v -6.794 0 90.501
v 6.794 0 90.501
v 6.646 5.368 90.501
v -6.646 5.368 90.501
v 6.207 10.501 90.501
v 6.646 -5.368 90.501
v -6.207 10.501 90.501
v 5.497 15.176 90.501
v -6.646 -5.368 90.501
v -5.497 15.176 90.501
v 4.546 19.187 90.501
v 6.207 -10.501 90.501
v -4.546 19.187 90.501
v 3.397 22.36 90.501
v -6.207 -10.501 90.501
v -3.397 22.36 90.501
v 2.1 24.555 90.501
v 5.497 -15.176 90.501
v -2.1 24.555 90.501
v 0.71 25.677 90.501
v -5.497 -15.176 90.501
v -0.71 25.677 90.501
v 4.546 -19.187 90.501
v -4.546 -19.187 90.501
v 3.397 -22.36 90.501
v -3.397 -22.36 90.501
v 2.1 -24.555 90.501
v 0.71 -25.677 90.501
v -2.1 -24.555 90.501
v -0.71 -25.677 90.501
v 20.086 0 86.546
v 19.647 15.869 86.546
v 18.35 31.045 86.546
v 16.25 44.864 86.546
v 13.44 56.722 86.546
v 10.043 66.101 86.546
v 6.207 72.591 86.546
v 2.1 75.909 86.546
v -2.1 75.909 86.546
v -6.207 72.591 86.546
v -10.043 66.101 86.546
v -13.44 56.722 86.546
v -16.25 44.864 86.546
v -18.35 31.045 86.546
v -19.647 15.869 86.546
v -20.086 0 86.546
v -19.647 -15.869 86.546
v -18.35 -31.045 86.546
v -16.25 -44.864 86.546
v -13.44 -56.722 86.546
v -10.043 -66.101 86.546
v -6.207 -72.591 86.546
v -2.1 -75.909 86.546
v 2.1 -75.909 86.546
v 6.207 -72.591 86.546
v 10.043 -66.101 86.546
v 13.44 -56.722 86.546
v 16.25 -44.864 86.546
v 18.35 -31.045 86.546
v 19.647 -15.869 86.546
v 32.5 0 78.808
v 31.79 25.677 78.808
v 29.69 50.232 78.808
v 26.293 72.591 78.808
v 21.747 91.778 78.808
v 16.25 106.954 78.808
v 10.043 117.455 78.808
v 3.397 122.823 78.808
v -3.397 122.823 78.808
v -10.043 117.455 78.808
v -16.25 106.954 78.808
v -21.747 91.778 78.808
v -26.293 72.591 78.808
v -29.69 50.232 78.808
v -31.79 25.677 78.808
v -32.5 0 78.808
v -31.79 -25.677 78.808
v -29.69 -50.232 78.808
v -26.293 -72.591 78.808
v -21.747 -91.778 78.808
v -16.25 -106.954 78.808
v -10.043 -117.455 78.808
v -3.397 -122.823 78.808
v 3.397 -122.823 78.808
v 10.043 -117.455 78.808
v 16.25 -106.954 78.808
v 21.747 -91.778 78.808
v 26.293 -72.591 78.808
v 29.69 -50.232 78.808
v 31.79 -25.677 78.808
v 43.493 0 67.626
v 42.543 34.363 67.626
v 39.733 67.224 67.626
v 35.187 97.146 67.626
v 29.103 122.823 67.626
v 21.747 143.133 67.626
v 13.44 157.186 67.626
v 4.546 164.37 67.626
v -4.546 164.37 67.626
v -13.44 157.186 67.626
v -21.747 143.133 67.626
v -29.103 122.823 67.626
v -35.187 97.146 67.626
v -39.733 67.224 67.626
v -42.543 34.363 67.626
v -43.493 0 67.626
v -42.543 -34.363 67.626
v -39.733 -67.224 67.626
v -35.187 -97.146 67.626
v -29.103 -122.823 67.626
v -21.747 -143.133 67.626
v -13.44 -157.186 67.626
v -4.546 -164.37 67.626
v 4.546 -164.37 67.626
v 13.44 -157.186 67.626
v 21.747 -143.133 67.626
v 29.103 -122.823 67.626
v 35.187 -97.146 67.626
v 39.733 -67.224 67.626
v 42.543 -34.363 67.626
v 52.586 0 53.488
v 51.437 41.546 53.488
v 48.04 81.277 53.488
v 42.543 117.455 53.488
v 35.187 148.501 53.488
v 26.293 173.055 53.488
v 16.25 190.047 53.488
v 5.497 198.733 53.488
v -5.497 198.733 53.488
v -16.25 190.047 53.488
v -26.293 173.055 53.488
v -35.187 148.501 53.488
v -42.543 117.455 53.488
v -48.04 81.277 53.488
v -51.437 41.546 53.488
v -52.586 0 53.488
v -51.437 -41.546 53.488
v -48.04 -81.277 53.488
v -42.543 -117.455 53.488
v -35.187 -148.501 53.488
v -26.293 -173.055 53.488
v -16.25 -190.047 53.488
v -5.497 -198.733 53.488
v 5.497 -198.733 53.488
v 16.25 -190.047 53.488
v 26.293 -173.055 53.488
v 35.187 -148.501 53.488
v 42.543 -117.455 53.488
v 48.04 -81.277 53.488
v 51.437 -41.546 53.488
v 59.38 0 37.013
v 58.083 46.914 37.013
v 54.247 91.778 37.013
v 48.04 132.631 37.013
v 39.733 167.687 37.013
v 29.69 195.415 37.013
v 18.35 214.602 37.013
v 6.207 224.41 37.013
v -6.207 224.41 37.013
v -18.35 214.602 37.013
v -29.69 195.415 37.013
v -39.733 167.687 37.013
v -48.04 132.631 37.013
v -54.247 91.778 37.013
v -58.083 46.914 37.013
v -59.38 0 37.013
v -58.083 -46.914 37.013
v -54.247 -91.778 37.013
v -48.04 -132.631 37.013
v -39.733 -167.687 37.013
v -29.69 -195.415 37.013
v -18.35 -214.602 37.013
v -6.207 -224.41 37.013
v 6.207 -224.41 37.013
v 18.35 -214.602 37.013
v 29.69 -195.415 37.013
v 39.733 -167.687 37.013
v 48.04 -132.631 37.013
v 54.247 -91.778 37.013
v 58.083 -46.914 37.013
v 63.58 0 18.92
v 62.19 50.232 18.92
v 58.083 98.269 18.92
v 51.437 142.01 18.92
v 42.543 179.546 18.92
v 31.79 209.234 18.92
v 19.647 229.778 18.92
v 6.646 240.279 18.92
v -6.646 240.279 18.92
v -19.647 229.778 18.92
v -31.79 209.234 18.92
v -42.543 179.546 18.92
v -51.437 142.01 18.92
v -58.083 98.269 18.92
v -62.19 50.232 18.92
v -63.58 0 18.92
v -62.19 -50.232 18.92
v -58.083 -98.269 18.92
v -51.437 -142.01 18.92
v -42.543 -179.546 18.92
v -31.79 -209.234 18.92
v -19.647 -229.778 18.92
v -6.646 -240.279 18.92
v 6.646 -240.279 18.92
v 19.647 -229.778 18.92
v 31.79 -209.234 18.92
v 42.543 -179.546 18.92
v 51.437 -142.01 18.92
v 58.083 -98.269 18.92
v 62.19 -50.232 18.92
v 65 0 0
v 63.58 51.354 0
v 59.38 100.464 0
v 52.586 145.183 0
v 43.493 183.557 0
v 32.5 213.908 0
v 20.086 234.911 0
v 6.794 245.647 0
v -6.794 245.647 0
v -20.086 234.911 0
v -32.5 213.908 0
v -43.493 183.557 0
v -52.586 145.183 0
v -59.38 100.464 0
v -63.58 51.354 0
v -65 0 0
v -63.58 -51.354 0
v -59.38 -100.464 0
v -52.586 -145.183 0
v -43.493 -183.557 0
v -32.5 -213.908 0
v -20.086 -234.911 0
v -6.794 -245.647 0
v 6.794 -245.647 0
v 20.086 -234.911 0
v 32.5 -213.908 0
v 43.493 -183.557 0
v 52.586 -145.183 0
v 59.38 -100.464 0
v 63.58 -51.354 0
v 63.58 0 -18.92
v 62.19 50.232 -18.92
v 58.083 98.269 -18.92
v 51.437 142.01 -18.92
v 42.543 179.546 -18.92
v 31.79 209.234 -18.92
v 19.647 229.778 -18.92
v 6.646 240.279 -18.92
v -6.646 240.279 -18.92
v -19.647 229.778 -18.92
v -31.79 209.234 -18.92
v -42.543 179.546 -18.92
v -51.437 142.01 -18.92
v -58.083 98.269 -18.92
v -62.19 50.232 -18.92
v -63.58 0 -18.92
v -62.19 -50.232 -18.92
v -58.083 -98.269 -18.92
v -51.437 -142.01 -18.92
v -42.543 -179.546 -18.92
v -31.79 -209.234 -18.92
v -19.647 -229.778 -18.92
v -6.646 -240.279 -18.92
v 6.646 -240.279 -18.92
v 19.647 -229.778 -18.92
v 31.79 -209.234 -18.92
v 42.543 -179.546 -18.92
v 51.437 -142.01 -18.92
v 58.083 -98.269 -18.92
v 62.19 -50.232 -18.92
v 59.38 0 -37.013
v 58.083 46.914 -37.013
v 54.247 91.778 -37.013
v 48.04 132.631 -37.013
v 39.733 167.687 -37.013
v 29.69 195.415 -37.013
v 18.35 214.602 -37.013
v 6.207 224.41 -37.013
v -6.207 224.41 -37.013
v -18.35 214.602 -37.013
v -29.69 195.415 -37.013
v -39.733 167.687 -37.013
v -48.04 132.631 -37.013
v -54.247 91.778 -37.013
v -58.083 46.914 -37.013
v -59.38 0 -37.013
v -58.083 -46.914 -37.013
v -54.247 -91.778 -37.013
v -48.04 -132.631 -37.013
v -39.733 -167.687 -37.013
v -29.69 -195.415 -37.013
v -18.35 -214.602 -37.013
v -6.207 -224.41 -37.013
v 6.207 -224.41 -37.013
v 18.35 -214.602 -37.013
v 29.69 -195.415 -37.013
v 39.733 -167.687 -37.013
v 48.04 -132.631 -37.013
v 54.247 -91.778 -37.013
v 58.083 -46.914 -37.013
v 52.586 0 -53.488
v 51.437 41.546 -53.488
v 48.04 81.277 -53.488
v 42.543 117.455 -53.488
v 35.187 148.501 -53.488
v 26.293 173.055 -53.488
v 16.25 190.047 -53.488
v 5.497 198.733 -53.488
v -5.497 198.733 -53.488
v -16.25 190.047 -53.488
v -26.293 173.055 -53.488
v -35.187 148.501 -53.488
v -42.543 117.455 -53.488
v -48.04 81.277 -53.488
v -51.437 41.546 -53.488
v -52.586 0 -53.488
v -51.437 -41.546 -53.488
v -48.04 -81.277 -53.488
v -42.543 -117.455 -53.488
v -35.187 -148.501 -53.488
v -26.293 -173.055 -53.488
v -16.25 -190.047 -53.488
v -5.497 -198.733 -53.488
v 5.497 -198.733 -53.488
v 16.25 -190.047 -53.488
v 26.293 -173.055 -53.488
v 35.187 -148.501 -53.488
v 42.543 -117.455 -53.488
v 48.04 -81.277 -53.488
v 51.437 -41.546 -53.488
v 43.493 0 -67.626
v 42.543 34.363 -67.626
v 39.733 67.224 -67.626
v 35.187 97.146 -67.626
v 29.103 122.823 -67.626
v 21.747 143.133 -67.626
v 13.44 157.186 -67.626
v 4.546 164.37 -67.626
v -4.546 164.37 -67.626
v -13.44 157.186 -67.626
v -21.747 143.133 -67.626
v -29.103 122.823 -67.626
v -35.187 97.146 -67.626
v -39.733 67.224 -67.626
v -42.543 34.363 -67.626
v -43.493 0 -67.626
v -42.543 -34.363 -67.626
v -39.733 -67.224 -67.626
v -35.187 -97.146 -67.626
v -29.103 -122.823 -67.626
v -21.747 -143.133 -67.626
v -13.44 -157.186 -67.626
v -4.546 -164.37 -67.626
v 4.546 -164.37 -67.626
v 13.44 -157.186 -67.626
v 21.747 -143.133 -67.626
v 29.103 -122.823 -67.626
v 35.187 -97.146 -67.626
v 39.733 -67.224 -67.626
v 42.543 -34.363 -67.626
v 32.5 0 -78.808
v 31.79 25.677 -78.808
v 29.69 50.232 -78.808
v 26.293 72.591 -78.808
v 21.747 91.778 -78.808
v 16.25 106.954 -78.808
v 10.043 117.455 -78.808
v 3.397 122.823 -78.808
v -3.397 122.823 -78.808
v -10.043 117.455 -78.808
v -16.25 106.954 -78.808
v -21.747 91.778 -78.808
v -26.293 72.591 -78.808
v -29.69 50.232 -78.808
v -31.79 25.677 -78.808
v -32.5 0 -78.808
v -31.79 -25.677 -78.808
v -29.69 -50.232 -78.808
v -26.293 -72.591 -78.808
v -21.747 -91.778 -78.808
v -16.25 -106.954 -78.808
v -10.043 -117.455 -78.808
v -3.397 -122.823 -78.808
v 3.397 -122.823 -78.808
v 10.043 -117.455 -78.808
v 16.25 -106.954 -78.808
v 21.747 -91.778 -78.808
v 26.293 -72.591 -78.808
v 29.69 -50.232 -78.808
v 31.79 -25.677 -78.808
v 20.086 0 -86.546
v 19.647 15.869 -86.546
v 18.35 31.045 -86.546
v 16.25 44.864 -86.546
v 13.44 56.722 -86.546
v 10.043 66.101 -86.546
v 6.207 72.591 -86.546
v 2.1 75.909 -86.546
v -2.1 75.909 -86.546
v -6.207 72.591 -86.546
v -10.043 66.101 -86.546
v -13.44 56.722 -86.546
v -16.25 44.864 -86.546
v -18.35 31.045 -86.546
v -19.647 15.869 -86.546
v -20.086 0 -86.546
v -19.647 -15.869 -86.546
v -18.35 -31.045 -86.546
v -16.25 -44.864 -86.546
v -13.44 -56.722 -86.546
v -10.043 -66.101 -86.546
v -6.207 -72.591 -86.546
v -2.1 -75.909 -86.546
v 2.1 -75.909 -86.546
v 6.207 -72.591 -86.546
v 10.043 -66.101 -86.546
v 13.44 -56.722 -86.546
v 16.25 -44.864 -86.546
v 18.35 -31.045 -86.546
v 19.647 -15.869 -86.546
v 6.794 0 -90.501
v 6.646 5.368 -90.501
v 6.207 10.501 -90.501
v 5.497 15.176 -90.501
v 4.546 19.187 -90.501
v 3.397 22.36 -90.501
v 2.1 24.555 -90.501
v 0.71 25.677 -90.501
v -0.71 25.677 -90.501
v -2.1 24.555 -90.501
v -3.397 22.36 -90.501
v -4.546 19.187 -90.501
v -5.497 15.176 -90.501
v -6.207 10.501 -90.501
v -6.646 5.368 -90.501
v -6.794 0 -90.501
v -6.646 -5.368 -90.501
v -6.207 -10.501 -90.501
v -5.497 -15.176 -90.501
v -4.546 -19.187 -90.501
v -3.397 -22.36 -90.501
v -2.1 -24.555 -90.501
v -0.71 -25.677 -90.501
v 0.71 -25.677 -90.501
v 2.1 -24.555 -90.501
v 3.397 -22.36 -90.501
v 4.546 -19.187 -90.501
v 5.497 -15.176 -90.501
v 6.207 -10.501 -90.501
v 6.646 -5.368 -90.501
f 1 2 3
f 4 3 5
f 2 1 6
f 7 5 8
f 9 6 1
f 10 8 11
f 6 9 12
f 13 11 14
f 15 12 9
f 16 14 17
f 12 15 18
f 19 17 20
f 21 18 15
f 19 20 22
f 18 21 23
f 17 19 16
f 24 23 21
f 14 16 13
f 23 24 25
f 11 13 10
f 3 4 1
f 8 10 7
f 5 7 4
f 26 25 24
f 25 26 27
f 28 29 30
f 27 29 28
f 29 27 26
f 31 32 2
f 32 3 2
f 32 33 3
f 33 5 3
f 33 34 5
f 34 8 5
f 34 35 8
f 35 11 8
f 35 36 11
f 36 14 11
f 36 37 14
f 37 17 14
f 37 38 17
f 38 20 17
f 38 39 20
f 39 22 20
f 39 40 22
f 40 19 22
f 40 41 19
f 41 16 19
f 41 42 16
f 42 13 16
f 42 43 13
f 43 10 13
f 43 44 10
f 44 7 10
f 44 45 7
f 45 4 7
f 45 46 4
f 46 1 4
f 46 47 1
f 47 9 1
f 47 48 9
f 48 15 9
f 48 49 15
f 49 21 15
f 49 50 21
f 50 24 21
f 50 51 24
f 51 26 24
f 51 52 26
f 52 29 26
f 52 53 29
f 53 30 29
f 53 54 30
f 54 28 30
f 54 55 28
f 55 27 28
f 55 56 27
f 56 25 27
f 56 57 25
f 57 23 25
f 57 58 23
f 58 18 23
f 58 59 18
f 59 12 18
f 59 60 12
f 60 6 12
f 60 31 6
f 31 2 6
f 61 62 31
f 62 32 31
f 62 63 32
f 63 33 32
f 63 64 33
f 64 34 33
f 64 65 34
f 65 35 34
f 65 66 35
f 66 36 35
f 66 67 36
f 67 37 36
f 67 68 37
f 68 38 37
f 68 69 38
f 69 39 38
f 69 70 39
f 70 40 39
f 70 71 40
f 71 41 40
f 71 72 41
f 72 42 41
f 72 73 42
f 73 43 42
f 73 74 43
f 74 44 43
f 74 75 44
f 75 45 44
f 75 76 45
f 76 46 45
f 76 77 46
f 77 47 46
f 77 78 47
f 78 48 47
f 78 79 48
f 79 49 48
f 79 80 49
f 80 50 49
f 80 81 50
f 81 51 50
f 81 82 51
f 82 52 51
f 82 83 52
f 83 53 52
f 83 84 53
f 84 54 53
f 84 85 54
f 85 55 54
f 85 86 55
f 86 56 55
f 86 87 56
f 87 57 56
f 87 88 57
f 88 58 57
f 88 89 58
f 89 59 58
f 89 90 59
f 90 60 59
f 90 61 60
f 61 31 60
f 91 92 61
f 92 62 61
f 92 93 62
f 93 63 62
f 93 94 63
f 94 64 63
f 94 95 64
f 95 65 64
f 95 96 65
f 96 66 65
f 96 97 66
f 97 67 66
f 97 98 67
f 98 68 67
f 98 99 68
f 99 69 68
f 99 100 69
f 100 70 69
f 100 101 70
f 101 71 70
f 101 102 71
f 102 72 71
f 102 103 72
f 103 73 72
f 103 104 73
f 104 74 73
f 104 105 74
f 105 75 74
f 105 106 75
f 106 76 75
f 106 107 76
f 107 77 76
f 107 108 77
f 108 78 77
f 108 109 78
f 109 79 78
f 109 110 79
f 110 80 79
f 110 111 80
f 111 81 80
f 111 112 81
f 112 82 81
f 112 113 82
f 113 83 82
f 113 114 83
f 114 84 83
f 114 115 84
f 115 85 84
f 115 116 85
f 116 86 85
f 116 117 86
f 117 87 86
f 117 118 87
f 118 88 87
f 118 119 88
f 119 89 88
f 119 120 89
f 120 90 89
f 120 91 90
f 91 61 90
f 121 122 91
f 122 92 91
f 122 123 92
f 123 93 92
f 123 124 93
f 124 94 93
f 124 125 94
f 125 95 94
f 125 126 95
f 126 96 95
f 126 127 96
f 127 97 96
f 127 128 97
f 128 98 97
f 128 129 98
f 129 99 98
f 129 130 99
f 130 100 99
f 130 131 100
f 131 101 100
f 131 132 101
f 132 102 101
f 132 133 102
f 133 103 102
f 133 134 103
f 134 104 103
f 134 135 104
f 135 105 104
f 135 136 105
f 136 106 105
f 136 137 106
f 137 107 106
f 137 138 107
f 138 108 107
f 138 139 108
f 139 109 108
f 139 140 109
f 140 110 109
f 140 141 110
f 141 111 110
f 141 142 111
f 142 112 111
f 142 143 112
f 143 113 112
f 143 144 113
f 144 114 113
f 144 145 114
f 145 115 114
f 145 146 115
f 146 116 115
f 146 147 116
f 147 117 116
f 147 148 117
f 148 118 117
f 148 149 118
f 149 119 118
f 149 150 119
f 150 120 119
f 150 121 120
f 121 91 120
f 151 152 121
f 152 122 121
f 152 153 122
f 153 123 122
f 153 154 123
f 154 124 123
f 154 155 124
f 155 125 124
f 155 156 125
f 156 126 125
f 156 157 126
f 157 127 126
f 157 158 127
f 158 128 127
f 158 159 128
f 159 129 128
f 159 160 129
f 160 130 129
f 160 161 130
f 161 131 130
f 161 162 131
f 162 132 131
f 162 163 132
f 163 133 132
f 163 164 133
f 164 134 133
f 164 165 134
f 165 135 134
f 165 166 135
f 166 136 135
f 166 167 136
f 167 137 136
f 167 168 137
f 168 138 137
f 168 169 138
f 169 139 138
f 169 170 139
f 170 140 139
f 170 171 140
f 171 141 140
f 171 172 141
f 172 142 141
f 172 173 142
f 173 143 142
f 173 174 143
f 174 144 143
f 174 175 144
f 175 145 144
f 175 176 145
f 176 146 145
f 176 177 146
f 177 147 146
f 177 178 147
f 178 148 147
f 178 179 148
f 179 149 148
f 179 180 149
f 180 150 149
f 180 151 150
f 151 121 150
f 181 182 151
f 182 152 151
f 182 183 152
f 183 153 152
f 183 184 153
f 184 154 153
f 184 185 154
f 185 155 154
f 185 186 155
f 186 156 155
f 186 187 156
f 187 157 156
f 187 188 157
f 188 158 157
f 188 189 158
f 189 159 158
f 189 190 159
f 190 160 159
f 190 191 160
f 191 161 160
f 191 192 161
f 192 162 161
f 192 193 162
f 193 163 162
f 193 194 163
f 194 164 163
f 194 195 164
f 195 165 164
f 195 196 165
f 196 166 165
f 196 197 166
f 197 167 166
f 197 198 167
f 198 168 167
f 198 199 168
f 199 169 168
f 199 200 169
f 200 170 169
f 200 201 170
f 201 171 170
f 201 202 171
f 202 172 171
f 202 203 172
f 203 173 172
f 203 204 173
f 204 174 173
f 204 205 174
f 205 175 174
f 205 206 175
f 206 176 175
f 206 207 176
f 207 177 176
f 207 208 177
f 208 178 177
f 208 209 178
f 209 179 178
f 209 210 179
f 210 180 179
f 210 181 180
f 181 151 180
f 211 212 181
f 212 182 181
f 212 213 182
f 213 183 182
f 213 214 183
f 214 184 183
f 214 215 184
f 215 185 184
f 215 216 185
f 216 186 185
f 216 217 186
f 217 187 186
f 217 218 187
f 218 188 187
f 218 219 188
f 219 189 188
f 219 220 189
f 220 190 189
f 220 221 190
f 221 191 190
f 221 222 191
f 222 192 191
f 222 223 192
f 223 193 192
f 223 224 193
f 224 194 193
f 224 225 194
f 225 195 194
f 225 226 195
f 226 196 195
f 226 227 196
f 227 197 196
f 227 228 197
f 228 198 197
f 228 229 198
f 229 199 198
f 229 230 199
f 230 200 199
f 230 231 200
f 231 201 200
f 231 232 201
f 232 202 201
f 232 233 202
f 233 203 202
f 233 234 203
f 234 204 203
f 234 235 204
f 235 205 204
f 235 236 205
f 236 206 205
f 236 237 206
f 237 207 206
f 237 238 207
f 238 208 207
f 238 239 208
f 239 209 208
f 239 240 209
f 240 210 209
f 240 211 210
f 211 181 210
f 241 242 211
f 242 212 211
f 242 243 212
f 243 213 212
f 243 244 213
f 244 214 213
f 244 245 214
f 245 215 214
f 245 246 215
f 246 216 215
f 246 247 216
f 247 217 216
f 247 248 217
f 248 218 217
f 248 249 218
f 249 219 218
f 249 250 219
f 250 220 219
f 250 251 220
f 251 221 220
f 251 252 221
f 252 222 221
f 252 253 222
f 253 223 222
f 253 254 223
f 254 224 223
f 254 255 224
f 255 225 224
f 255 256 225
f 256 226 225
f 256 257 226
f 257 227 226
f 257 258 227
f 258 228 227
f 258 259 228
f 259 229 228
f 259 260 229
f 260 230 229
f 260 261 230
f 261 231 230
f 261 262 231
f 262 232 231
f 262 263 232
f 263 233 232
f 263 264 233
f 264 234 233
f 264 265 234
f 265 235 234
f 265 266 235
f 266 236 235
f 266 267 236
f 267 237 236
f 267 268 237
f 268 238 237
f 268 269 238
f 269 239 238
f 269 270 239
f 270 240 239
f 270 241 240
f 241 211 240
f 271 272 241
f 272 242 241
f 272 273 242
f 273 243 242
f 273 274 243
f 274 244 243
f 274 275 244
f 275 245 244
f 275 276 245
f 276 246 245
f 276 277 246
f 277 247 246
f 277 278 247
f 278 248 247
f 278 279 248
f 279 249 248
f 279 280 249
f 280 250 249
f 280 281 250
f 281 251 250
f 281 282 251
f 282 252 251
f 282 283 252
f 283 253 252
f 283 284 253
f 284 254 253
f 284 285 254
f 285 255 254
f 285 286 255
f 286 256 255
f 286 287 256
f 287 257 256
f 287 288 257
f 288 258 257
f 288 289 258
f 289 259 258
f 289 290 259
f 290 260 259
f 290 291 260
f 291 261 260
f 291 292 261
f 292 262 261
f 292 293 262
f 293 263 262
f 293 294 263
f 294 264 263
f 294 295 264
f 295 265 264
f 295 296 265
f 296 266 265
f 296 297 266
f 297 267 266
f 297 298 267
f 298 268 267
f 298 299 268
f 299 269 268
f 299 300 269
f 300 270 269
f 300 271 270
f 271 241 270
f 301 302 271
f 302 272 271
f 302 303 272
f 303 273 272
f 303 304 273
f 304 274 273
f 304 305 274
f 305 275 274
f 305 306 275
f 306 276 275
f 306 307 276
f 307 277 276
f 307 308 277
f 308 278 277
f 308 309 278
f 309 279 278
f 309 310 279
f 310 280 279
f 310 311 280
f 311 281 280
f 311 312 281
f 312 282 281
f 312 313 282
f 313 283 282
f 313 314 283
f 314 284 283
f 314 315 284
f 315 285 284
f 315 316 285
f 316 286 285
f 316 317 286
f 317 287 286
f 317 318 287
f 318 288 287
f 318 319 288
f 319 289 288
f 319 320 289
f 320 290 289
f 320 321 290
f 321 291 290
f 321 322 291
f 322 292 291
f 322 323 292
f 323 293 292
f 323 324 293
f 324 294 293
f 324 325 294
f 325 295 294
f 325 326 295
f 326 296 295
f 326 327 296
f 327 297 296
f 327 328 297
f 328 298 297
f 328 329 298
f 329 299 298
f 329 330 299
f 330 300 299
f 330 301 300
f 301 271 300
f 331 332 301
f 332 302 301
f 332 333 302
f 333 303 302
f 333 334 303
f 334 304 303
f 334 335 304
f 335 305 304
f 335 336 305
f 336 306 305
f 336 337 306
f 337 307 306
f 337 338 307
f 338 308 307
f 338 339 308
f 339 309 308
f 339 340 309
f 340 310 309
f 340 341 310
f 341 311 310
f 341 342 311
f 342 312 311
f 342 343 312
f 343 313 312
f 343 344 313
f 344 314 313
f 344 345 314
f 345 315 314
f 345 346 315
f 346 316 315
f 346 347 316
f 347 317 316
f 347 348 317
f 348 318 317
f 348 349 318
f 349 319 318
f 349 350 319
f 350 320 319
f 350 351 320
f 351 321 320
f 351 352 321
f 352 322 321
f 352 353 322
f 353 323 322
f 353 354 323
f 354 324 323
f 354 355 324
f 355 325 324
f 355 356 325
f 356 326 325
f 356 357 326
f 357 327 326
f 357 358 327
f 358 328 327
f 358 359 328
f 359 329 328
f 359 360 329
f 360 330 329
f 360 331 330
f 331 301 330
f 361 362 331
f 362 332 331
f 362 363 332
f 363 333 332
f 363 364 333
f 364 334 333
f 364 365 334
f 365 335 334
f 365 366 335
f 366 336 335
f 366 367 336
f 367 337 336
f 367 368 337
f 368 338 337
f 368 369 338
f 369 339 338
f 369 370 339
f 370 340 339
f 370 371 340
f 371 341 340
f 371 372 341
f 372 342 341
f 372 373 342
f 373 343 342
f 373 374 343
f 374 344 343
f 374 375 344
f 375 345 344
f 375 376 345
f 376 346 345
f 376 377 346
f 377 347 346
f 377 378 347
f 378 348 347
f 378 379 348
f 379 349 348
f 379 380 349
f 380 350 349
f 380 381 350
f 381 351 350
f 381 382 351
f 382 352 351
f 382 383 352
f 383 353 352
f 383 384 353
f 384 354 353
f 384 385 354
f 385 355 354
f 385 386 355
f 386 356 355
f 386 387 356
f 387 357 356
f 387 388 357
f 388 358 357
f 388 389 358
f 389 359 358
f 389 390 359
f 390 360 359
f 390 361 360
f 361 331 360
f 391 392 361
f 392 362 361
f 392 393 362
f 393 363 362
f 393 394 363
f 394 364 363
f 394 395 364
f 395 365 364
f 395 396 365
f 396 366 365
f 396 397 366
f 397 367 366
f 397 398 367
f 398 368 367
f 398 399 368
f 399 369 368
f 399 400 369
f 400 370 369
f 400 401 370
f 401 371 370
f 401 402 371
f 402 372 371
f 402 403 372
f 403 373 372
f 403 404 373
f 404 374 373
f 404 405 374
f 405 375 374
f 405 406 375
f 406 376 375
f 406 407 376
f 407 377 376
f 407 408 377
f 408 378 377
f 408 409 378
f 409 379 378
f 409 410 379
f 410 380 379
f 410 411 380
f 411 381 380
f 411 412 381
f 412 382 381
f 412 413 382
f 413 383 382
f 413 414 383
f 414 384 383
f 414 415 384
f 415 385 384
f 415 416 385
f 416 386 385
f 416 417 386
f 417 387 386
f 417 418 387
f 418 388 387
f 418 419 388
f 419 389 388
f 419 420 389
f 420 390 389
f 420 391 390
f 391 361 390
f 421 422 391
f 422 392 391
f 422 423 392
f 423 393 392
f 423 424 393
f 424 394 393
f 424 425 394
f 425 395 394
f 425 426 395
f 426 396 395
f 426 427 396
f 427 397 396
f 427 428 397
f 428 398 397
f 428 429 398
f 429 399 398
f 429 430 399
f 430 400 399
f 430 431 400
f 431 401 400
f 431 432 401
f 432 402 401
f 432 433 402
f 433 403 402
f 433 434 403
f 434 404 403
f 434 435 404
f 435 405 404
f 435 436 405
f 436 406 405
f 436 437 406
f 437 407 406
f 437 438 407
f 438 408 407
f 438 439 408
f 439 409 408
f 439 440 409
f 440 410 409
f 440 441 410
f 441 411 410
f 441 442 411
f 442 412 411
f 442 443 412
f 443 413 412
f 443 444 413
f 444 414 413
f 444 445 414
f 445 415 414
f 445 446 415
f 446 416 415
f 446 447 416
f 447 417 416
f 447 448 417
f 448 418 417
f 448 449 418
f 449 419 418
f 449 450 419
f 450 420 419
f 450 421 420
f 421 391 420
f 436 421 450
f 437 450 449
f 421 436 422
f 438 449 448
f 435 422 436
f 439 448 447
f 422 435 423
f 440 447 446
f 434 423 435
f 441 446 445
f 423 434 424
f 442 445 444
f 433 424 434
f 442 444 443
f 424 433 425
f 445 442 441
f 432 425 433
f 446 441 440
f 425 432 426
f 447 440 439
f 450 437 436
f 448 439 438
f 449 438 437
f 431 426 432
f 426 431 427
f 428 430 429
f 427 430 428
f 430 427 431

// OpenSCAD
// Generated by SolidPython 1.0.1 on 2020-07-29 00:46:47


scale(v = [5, 19, 7]) {
	sphere(r = 13);
}
/***********************************************
*********      SolidPython code:      **********
************************************************
 
# import packages: SolidPython
from solid import *
from solid.utils import *
from itertools import chain, combinations, permutations


class Resize:

    def __init__(self, scad_file):
        self.scad_file = scad_file
        #self.scad_file = import_scad(scad_file)
        # cone/cylinder param:
        self.r1 = 0
        self.r2 = 0
        self.h = 0
        # rectangular prism param:
        self.w = 0
        self.l = 0
        # ellipse param:
        self.r = 0

    # import OpenScad code (file name corresponds to shape)


    # classify shape + parameters
    def assign(self, param1, param2, param3):
        if self.scad_file == 'cone.scad':
            self.r1 = param1
            self.r2 = param2
            self.h = param3
        elif self.scad_file == 'cylinder.scad':
            self.r1 = param1
            self.r2 = param2
            self.h = param3
        elif self.scad_file == 'rectangularPrism.scad':
            self.h = param1
            self.l = param2
            self.w = param3
        else:
            self.r = param1
            self.h = param2

    # resize parameters
    def iterate(self):
        x = range(3, 20, 2)
        i = 1
        if self.scad_file == 'cone.scad':
            tempList = list(permutations(x, 2))
            for temp in tempList:
                param1 = temp[0]
                param2 = temp[1]
                filepath = 'produced_scad_files/' + 'cone' + str(param1) + '_' + str(param2) + '_' + '.scad'
                scad_render_to_file(cylinder(h=param1, r1=param2, r2=0), filepath)

        elif self.scad_file == 'cylinder.scad':
            tempList = list(permutations(x, 3))
            for temp in tempList:
                param1 = temp[0]
                param2 = temp[1]
                filepath = 'produced_scad_files/' + 'cylinder' + str(param1) + '_' + str(param2) + '_' + '.scad'
                scad_render_to_file(cylinder(h=param1, r1=param2, r2=param2), filepath)

        elif self.scad_file == 'rectangularPrism.scad':
            tempList = list(permutations(x, 3))
            for temp in tempList:
                param1 = temp[0]
                param2 = temp[1]
                param3 = temp[2]
                filepath = 'produced_scad_files/' + 'rectangularPrism' + str(param1) + '_' + str(param2) + '_' + str(
                    param3) + '.scad'
                scad_render_to_file(cube(size=(param1, param2, param3)), filepath)

        elif self.scad_file == 'ellipse.scad':
            tempList = list(permutations(x, 4))
            for temp in tempList:
                param1 = temp[0]
                param2 = temp[1]
                param3 = temp[2]
                param4 = temp[3]
                filepath = 'produced_scad_files/' + 'ellipse' + str(param1) + '_' + str(param2) + '_' + str(param3) + '_' + str(param4) + '.scad'
                scad_render_to_file(scale([param1, param2, param3])(sphere(r=param4)), filepath)

    def render_to_scadfile(self):
        scad_render_to_file(scad, 'example.scad') 
 
************************************************/
